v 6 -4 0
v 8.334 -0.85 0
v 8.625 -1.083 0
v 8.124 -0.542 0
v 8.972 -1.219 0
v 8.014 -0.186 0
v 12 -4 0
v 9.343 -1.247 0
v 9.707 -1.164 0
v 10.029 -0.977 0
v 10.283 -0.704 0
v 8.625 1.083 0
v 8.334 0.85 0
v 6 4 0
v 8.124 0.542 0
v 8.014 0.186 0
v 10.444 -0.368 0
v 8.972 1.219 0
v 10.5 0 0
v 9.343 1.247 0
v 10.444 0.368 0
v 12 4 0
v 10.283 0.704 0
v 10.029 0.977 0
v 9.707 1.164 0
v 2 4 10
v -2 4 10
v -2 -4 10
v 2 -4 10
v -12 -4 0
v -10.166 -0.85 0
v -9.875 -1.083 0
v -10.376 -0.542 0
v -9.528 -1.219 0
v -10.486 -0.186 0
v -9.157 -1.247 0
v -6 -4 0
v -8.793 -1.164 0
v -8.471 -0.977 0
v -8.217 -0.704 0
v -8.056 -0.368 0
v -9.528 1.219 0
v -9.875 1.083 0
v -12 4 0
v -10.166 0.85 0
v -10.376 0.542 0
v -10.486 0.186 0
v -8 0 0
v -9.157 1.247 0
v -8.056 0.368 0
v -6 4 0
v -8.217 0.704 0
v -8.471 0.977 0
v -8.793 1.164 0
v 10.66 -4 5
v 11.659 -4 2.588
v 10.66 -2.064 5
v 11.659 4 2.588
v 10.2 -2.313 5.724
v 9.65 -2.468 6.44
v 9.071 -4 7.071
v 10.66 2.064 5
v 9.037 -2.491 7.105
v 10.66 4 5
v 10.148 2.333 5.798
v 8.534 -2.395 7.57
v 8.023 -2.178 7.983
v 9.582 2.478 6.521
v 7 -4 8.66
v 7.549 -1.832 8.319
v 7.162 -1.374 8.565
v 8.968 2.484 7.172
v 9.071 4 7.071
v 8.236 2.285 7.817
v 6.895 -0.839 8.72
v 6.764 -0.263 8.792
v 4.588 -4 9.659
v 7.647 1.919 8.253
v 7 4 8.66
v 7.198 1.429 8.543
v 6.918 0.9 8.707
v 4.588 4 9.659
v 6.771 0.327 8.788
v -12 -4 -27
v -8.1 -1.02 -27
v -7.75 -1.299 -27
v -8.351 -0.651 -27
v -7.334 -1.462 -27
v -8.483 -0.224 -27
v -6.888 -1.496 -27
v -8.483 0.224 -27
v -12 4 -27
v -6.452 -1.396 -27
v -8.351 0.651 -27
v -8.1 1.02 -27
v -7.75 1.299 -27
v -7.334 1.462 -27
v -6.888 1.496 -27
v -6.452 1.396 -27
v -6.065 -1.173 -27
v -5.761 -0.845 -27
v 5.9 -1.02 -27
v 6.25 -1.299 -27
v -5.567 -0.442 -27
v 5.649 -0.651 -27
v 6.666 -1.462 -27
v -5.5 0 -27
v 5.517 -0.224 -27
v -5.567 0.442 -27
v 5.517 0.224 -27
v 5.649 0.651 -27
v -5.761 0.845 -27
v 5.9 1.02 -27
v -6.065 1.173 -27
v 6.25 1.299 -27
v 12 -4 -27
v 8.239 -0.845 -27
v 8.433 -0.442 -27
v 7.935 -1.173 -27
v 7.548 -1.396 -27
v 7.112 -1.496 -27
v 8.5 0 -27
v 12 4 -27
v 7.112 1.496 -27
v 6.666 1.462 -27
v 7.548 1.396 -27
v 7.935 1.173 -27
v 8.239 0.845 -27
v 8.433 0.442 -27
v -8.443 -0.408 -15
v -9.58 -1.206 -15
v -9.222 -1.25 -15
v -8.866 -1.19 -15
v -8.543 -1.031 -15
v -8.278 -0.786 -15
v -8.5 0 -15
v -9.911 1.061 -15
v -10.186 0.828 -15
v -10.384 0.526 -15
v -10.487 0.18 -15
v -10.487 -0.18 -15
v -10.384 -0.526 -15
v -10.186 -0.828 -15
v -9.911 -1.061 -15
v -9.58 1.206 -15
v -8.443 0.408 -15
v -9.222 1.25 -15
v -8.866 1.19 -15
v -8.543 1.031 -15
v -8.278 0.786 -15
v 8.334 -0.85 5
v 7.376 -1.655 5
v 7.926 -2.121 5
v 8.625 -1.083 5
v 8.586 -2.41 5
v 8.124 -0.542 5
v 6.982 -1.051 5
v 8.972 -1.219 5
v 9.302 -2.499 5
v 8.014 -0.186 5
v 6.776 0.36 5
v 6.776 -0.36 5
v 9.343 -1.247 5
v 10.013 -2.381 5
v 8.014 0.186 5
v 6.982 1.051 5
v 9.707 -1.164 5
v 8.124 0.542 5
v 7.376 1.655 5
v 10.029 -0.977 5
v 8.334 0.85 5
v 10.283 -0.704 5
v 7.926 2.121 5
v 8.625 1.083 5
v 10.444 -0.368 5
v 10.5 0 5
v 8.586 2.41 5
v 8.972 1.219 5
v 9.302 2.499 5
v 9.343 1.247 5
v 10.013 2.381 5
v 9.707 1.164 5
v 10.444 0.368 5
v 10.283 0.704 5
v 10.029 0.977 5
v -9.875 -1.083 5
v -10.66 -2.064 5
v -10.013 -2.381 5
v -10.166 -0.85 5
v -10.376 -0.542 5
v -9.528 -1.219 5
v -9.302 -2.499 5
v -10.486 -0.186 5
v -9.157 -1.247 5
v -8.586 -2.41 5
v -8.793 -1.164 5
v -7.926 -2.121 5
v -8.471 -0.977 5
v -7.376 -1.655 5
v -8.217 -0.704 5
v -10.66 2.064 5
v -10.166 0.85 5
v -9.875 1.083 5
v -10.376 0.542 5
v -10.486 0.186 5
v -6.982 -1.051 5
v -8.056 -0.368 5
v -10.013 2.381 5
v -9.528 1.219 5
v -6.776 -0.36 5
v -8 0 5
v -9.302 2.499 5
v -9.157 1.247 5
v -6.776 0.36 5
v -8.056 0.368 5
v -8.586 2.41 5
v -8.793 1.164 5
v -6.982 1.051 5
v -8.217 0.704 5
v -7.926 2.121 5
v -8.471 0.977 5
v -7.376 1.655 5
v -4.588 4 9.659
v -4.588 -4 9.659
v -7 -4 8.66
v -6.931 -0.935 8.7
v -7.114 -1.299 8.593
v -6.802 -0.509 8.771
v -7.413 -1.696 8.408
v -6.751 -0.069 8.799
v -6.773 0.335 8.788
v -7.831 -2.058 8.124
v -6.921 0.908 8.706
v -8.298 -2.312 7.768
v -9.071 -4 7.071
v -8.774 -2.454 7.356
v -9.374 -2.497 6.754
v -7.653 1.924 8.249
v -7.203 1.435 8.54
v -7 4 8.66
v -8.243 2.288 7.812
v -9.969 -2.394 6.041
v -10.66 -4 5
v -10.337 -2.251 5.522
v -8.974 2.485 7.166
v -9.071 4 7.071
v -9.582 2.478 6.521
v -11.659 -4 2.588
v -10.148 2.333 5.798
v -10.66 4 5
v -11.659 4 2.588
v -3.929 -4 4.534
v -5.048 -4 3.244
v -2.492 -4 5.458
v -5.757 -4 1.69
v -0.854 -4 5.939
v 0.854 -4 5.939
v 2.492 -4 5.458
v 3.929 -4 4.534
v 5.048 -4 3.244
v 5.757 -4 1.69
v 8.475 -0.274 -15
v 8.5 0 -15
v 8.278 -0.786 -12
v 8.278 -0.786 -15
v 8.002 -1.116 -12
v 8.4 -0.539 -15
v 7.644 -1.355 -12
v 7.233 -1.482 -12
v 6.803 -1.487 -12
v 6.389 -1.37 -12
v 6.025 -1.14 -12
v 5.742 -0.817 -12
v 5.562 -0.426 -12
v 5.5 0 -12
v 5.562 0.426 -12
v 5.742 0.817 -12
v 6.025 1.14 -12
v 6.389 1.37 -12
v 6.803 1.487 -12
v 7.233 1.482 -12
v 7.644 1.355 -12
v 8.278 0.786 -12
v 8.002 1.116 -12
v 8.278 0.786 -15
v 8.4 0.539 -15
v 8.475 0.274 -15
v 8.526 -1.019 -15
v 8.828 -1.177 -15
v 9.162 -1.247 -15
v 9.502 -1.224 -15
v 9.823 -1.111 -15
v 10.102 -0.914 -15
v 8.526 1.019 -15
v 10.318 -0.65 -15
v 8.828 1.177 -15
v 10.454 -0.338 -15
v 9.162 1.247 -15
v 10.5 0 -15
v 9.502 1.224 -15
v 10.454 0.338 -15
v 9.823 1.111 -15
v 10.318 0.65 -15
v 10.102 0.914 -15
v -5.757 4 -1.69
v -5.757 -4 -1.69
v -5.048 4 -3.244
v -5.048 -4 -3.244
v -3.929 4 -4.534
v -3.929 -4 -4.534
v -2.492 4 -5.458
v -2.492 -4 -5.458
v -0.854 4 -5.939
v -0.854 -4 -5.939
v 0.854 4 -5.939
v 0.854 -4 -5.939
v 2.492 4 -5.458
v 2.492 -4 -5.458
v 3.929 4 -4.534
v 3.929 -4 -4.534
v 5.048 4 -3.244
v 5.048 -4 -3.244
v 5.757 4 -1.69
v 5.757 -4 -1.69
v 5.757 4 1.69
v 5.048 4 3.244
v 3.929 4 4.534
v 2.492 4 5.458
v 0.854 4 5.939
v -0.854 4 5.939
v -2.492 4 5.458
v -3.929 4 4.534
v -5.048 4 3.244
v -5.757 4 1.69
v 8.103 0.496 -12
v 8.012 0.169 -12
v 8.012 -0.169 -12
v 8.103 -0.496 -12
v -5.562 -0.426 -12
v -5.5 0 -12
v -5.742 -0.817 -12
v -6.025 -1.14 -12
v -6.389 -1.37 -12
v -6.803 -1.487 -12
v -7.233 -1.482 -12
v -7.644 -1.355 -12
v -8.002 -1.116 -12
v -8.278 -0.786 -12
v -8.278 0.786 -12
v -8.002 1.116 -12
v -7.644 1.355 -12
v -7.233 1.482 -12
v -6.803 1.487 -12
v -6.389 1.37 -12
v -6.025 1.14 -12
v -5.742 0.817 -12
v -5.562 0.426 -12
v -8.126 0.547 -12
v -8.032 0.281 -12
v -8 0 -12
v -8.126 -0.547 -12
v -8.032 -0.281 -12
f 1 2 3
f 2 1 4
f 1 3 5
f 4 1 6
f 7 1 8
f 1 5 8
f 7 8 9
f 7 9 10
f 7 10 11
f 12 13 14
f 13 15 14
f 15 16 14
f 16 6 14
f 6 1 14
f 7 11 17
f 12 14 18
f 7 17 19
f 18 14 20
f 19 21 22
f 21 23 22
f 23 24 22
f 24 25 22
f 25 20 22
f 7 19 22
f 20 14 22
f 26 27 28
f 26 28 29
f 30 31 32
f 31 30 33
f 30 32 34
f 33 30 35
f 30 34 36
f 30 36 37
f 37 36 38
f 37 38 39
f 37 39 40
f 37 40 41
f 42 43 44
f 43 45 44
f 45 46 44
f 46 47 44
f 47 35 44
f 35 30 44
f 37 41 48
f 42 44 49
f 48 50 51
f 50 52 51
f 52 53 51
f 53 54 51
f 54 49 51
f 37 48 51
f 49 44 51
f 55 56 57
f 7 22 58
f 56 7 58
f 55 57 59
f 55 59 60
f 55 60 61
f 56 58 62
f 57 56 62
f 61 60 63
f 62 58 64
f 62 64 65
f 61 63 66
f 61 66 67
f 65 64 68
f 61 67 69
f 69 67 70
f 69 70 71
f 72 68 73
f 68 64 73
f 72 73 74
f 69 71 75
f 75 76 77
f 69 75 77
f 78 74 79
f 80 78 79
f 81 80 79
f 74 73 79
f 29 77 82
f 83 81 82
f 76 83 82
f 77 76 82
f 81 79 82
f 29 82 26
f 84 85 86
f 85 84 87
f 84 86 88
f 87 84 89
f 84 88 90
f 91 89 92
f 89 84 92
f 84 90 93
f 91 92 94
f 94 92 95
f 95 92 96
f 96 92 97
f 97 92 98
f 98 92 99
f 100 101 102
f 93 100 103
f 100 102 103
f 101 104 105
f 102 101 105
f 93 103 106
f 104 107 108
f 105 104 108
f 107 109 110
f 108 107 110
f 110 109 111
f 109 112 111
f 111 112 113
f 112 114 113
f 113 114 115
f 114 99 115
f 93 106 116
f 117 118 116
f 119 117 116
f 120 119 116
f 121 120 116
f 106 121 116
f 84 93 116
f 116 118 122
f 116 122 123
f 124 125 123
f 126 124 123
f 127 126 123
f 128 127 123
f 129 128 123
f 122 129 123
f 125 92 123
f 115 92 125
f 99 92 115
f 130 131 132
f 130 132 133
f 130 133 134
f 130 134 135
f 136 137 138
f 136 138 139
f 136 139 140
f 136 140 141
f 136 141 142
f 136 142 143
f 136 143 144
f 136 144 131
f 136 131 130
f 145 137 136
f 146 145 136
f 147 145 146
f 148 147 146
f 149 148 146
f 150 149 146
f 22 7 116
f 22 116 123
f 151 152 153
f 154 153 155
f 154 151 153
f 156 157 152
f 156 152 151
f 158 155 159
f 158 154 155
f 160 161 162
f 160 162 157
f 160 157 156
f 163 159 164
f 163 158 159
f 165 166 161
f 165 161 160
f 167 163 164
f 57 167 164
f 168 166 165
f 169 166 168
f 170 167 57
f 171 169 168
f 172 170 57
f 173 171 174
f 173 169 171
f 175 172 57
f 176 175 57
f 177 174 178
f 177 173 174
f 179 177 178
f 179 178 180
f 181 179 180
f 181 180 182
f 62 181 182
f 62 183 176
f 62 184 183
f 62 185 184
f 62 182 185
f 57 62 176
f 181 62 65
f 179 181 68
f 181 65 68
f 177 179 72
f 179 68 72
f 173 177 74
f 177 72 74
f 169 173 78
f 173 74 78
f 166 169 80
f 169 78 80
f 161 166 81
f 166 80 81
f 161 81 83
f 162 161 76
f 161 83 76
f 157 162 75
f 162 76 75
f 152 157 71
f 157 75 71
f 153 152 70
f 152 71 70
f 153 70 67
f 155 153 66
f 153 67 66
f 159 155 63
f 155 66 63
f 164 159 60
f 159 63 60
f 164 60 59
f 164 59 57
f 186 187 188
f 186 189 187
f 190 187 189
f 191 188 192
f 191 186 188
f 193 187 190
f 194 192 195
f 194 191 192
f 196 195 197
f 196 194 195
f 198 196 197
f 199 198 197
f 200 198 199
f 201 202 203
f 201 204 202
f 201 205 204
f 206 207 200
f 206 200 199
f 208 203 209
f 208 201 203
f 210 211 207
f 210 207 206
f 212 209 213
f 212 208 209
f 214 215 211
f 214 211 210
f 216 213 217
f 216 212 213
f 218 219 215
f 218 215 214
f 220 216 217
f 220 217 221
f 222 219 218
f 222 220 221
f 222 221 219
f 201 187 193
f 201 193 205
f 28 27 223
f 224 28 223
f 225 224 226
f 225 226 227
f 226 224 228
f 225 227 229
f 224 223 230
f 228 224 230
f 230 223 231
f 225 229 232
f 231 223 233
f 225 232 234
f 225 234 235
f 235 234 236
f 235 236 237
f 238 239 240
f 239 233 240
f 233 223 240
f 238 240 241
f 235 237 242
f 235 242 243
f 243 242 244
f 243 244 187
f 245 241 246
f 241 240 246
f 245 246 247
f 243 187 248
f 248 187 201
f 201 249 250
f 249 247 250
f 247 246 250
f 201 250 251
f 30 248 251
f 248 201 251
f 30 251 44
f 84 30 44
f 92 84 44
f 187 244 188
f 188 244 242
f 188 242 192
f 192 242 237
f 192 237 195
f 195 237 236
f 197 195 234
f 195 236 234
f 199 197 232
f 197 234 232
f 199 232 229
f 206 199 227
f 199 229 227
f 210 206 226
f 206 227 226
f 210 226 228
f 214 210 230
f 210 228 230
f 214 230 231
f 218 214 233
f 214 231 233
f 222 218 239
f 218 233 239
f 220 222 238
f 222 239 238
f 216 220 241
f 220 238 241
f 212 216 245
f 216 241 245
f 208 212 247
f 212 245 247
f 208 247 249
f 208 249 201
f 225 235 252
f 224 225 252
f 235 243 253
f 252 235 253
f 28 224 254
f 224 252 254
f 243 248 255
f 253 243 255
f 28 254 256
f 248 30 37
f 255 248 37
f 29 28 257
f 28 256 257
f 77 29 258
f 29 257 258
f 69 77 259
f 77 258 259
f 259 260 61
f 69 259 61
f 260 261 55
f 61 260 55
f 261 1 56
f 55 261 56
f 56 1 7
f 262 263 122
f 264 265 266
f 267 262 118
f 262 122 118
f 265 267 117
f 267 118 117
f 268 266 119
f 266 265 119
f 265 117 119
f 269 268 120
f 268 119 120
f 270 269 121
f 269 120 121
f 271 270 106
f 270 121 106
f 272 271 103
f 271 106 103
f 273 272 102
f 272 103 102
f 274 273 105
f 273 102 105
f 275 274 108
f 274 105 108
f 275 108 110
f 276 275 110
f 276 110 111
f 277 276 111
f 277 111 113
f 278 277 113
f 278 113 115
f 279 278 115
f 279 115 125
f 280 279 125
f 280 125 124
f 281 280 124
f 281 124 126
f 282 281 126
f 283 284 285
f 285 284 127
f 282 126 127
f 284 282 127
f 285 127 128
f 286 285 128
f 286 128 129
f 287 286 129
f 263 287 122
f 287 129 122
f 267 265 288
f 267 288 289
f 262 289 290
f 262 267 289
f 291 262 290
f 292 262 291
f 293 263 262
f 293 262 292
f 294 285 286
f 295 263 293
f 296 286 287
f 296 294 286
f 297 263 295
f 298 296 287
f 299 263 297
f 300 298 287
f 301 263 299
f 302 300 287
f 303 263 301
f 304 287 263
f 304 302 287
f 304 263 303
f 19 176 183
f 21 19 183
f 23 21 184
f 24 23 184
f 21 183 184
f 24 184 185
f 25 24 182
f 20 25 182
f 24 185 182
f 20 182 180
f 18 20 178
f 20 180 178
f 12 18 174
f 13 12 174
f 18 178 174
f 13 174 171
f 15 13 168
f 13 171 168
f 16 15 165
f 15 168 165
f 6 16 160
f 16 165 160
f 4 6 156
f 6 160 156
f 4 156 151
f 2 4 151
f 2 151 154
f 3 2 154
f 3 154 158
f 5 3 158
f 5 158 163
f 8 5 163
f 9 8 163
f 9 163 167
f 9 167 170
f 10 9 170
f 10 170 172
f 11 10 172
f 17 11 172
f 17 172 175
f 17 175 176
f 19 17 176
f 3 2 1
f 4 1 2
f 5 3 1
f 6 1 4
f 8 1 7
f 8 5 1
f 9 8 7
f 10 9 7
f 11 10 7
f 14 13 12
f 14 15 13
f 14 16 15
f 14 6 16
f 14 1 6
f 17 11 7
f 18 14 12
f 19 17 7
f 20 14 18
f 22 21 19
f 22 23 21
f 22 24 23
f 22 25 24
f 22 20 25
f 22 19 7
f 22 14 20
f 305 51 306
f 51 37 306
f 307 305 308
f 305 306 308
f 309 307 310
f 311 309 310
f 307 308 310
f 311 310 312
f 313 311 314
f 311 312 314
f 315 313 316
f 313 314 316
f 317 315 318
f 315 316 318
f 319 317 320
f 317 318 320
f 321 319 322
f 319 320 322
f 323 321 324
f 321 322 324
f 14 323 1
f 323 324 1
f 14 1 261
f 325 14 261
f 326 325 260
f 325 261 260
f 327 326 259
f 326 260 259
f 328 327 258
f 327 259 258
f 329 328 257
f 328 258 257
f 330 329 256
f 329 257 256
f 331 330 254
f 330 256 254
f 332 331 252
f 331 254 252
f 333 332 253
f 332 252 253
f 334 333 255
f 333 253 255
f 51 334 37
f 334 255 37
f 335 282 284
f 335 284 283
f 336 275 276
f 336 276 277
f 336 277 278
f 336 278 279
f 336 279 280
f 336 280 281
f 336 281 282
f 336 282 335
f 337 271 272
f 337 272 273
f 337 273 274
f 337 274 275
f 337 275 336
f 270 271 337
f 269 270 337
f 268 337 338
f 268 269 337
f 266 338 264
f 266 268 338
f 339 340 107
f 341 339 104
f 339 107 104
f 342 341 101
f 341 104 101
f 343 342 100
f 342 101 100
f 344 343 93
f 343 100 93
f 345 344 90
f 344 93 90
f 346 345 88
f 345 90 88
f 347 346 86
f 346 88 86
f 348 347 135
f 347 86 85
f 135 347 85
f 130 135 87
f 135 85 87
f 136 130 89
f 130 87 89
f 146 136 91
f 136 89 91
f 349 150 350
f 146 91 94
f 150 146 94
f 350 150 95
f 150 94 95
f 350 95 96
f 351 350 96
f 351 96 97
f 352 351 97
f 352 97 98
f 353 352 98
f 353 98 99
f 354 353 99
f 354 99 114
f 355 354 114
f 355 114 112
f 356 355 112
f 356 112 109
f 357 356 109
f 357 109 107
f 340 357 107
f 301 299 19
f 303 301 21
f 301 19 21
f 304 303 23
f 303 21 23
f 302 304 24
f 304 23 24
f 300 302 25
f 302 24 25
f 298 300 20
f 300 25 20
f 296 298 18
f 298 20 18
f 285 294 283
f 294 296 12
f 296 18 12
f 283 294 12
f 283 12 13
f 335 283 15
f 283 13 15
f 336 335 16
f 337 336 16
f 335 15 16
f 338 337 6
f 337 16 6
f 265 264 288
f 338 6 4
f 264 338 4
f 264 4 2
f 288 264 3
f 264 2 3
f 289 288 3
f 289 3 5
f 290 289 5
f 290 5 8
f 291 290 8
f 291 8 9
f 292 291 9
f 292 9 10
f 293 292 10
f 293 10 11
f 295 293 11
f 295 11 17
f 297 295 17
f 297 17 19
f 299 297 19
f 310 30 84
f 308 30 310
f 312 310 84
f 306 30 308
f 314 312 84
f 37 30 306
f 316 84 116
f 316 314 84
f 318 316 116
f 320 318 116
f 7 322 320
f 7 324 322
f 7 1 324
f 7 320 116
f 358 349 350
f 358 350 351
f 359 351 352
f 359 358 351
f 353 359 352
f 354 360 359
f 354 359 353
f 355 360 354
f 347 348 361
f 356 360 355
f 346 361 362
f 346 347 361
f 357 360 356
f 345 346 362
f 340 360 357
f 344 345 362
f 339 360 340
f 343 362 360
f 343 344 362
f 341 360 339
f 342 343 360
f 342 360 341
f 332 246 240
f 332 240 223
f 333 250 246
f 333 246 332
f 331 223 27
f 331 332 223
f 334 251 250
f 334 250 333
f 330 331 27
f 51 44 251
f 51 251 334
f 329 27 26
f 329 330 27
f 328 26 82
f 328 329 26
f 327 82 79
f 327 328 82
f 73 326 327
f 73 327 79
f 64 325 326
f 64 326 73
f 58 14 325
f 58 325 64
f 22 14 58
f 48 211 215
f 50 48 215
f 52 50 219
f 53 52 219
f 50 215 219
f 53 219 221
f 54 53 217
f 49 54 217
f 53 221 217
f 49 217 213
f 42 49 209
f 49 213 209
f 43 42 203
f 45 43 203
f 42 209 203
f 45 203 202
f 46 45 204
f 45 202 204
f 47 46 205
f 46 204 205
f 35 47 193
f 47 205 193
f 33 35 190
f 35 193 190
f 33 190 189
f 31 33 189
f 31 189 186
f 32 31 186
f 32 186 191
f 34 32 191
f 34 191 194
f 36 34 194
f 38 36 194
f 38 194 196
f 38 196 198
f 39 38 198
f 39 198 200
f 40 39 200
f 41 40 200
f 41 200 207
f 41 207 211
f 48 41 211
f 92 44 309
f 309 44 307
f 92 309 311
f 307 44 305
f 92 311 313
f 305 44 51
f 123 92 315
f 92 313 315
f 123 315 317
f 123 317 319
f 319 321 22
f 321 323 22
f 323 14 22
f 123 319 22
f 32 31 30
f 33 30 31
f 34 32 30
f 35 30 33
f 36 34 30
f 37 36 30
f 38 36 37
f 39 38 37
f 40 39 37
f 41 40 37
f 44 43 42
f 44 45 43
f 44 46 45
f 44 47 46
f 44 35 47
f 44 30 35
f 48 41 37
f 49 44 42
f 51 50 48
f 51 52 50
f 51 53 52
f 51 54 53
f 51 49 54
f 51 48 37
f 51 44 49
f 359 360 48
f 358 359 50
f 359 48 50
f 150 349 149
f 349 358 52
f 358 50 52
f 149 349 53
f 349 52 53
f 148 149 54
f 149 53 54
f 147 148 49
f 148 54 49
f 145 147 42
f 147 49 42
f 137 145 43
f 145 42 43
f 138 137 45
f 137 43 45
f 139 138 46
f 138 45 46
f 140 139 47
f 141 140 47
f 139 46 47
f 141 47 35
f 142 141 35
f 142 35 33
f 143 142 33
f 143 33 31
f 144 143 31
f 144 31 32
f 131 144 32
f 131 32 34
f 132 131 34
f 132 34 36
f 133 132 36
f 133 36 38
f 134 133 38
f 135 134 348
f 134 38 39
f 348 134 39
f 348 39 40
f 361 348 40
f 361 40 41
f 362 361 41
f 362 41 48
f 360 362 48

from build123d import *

# Parameters (mm, degrees)
F0_W         = 24
F0_H         = 8
F1_DEPTH     = 27
F2_W         = 24
F2_H         = 8
F3_DEPTH     = 10
F4_R         = 6
F5_DEPTH     = 12.5
F6_R         = 1.25
F7_DEPTH     = 25
F8_R         = 1.5
F9_DEPTH     = 15
F10_R        = 2.5
F11_DEPTH    = 5
F12_T1_DEPTH = 58


# Not quite as in the source:
# - a fillet or chamfer that OpenCascade refuses, or shapes differently, is made with other operations: its cross-section is extruded or revolved along the edge and cut away or added


with BuildPart() as f1:
    # F0 (on Top) → F1 (new body)
    with BuildSketch(Plane.XY):
        Rectangle(F0_W, F0_H)
    extrude(amount=-F1_DEPTH)


with BuildPart() as f3:
    # F2 (on Top) → F3 (new body)
    with BuildSketch(Plane.XY):
        Rectangle(F2_W, F2_H)
    extrude(amount=F3_DEPTH)


with BuildPart() as f5_tool:
    # F4 (on Front) → F5 (new body, symmetric)
    with BuildSketch(Plane.XZ):
        Circle(F4_R)
    extrude(amount=F5_DEPTH, both=True)


with BuildPart() as f1_1:
    add(f1.part)

    # F5: cut by f5_tool
    add(f5_tool.part, mode=Mode.SUBTRACT)


with BuildPart() as f3_1:
    add(f3.part)

    # F5: cut by f5_tool
    add(f5_tool.part, mode=Mode.SUBTRACT)


with BuildPart() as f7_tool:
    # F6 (on face) → F7 (new body)
    with BuildSketch(Plane.XY.offset(10)):
        with Locations((9.25, 0)):
            Circle(F6_R)
        with Locations((-9.25, 0)):
            Circle(F6_R)
    extrude(amount=-F7_DEPTH)


with BuildPart() as f1_2:
    add(f1_1.part)

    # F7: cut by f7_tool
    add(f7_tool.part, mode=Mode.SUBTRACT)

    # F8 (on face) → F9 (cut)
    with BuildSketch(Plane(origin=(0, 0, -27), x_dir=(1, 0, 0), z_dir=(0, 0, -1))):
        with Locations((7, 0)):
            Circle(F8_R)
        with Locations((-7, 0)):
            Circle(F8_R)
    extrude(amount=-F9_DEPTH, mode=Mode.SUBTRACT)


with BuildPart() as f3_2:
    add(f3_1.part)

    # F7: cut by f7_tool
    add(f7_tool.part, mode=Mode.SUBTRACT)

    # F10 (on face) → F11 (cut)
    with BuildSketch(Plane.XY.offset(10)):
        with Locations((9.25, 0)):
            Circle(F10_R)
        with Locations((-9.25, 0)):
            Circle(F10_R)
    extrude(amount=-F11_DEPTH, mode=Mode.SUBTRACT)

    # F12: fillet of radius 10 on 2 edges, made by hand

    # F12_s2 → F12_t1 (cut)
    with BuildSketch(Plane.XZ.offset(-29)):
        with BuildLine():
            ThreePointArc((12, 0), (9.0710678119, 7.0710678119), (2, 10))
            Line((2, 10), (12, 10))
            Line((12, 10), (12, 0))
        make_face()
        with BuildLine():
            ThreePointArc((-2, 10), (-9.0710678119, 7.0710678119), (-12, 0))
            Line((-12, 0), (-12, 10))
            Line((-12, 10), (-2, 10))
        make_face()
    extrude(amount=F12_T1_DEPTH, mode=Mode.SUBTRACT)


solid = Compound([f1_2.part, f3_2.part])
